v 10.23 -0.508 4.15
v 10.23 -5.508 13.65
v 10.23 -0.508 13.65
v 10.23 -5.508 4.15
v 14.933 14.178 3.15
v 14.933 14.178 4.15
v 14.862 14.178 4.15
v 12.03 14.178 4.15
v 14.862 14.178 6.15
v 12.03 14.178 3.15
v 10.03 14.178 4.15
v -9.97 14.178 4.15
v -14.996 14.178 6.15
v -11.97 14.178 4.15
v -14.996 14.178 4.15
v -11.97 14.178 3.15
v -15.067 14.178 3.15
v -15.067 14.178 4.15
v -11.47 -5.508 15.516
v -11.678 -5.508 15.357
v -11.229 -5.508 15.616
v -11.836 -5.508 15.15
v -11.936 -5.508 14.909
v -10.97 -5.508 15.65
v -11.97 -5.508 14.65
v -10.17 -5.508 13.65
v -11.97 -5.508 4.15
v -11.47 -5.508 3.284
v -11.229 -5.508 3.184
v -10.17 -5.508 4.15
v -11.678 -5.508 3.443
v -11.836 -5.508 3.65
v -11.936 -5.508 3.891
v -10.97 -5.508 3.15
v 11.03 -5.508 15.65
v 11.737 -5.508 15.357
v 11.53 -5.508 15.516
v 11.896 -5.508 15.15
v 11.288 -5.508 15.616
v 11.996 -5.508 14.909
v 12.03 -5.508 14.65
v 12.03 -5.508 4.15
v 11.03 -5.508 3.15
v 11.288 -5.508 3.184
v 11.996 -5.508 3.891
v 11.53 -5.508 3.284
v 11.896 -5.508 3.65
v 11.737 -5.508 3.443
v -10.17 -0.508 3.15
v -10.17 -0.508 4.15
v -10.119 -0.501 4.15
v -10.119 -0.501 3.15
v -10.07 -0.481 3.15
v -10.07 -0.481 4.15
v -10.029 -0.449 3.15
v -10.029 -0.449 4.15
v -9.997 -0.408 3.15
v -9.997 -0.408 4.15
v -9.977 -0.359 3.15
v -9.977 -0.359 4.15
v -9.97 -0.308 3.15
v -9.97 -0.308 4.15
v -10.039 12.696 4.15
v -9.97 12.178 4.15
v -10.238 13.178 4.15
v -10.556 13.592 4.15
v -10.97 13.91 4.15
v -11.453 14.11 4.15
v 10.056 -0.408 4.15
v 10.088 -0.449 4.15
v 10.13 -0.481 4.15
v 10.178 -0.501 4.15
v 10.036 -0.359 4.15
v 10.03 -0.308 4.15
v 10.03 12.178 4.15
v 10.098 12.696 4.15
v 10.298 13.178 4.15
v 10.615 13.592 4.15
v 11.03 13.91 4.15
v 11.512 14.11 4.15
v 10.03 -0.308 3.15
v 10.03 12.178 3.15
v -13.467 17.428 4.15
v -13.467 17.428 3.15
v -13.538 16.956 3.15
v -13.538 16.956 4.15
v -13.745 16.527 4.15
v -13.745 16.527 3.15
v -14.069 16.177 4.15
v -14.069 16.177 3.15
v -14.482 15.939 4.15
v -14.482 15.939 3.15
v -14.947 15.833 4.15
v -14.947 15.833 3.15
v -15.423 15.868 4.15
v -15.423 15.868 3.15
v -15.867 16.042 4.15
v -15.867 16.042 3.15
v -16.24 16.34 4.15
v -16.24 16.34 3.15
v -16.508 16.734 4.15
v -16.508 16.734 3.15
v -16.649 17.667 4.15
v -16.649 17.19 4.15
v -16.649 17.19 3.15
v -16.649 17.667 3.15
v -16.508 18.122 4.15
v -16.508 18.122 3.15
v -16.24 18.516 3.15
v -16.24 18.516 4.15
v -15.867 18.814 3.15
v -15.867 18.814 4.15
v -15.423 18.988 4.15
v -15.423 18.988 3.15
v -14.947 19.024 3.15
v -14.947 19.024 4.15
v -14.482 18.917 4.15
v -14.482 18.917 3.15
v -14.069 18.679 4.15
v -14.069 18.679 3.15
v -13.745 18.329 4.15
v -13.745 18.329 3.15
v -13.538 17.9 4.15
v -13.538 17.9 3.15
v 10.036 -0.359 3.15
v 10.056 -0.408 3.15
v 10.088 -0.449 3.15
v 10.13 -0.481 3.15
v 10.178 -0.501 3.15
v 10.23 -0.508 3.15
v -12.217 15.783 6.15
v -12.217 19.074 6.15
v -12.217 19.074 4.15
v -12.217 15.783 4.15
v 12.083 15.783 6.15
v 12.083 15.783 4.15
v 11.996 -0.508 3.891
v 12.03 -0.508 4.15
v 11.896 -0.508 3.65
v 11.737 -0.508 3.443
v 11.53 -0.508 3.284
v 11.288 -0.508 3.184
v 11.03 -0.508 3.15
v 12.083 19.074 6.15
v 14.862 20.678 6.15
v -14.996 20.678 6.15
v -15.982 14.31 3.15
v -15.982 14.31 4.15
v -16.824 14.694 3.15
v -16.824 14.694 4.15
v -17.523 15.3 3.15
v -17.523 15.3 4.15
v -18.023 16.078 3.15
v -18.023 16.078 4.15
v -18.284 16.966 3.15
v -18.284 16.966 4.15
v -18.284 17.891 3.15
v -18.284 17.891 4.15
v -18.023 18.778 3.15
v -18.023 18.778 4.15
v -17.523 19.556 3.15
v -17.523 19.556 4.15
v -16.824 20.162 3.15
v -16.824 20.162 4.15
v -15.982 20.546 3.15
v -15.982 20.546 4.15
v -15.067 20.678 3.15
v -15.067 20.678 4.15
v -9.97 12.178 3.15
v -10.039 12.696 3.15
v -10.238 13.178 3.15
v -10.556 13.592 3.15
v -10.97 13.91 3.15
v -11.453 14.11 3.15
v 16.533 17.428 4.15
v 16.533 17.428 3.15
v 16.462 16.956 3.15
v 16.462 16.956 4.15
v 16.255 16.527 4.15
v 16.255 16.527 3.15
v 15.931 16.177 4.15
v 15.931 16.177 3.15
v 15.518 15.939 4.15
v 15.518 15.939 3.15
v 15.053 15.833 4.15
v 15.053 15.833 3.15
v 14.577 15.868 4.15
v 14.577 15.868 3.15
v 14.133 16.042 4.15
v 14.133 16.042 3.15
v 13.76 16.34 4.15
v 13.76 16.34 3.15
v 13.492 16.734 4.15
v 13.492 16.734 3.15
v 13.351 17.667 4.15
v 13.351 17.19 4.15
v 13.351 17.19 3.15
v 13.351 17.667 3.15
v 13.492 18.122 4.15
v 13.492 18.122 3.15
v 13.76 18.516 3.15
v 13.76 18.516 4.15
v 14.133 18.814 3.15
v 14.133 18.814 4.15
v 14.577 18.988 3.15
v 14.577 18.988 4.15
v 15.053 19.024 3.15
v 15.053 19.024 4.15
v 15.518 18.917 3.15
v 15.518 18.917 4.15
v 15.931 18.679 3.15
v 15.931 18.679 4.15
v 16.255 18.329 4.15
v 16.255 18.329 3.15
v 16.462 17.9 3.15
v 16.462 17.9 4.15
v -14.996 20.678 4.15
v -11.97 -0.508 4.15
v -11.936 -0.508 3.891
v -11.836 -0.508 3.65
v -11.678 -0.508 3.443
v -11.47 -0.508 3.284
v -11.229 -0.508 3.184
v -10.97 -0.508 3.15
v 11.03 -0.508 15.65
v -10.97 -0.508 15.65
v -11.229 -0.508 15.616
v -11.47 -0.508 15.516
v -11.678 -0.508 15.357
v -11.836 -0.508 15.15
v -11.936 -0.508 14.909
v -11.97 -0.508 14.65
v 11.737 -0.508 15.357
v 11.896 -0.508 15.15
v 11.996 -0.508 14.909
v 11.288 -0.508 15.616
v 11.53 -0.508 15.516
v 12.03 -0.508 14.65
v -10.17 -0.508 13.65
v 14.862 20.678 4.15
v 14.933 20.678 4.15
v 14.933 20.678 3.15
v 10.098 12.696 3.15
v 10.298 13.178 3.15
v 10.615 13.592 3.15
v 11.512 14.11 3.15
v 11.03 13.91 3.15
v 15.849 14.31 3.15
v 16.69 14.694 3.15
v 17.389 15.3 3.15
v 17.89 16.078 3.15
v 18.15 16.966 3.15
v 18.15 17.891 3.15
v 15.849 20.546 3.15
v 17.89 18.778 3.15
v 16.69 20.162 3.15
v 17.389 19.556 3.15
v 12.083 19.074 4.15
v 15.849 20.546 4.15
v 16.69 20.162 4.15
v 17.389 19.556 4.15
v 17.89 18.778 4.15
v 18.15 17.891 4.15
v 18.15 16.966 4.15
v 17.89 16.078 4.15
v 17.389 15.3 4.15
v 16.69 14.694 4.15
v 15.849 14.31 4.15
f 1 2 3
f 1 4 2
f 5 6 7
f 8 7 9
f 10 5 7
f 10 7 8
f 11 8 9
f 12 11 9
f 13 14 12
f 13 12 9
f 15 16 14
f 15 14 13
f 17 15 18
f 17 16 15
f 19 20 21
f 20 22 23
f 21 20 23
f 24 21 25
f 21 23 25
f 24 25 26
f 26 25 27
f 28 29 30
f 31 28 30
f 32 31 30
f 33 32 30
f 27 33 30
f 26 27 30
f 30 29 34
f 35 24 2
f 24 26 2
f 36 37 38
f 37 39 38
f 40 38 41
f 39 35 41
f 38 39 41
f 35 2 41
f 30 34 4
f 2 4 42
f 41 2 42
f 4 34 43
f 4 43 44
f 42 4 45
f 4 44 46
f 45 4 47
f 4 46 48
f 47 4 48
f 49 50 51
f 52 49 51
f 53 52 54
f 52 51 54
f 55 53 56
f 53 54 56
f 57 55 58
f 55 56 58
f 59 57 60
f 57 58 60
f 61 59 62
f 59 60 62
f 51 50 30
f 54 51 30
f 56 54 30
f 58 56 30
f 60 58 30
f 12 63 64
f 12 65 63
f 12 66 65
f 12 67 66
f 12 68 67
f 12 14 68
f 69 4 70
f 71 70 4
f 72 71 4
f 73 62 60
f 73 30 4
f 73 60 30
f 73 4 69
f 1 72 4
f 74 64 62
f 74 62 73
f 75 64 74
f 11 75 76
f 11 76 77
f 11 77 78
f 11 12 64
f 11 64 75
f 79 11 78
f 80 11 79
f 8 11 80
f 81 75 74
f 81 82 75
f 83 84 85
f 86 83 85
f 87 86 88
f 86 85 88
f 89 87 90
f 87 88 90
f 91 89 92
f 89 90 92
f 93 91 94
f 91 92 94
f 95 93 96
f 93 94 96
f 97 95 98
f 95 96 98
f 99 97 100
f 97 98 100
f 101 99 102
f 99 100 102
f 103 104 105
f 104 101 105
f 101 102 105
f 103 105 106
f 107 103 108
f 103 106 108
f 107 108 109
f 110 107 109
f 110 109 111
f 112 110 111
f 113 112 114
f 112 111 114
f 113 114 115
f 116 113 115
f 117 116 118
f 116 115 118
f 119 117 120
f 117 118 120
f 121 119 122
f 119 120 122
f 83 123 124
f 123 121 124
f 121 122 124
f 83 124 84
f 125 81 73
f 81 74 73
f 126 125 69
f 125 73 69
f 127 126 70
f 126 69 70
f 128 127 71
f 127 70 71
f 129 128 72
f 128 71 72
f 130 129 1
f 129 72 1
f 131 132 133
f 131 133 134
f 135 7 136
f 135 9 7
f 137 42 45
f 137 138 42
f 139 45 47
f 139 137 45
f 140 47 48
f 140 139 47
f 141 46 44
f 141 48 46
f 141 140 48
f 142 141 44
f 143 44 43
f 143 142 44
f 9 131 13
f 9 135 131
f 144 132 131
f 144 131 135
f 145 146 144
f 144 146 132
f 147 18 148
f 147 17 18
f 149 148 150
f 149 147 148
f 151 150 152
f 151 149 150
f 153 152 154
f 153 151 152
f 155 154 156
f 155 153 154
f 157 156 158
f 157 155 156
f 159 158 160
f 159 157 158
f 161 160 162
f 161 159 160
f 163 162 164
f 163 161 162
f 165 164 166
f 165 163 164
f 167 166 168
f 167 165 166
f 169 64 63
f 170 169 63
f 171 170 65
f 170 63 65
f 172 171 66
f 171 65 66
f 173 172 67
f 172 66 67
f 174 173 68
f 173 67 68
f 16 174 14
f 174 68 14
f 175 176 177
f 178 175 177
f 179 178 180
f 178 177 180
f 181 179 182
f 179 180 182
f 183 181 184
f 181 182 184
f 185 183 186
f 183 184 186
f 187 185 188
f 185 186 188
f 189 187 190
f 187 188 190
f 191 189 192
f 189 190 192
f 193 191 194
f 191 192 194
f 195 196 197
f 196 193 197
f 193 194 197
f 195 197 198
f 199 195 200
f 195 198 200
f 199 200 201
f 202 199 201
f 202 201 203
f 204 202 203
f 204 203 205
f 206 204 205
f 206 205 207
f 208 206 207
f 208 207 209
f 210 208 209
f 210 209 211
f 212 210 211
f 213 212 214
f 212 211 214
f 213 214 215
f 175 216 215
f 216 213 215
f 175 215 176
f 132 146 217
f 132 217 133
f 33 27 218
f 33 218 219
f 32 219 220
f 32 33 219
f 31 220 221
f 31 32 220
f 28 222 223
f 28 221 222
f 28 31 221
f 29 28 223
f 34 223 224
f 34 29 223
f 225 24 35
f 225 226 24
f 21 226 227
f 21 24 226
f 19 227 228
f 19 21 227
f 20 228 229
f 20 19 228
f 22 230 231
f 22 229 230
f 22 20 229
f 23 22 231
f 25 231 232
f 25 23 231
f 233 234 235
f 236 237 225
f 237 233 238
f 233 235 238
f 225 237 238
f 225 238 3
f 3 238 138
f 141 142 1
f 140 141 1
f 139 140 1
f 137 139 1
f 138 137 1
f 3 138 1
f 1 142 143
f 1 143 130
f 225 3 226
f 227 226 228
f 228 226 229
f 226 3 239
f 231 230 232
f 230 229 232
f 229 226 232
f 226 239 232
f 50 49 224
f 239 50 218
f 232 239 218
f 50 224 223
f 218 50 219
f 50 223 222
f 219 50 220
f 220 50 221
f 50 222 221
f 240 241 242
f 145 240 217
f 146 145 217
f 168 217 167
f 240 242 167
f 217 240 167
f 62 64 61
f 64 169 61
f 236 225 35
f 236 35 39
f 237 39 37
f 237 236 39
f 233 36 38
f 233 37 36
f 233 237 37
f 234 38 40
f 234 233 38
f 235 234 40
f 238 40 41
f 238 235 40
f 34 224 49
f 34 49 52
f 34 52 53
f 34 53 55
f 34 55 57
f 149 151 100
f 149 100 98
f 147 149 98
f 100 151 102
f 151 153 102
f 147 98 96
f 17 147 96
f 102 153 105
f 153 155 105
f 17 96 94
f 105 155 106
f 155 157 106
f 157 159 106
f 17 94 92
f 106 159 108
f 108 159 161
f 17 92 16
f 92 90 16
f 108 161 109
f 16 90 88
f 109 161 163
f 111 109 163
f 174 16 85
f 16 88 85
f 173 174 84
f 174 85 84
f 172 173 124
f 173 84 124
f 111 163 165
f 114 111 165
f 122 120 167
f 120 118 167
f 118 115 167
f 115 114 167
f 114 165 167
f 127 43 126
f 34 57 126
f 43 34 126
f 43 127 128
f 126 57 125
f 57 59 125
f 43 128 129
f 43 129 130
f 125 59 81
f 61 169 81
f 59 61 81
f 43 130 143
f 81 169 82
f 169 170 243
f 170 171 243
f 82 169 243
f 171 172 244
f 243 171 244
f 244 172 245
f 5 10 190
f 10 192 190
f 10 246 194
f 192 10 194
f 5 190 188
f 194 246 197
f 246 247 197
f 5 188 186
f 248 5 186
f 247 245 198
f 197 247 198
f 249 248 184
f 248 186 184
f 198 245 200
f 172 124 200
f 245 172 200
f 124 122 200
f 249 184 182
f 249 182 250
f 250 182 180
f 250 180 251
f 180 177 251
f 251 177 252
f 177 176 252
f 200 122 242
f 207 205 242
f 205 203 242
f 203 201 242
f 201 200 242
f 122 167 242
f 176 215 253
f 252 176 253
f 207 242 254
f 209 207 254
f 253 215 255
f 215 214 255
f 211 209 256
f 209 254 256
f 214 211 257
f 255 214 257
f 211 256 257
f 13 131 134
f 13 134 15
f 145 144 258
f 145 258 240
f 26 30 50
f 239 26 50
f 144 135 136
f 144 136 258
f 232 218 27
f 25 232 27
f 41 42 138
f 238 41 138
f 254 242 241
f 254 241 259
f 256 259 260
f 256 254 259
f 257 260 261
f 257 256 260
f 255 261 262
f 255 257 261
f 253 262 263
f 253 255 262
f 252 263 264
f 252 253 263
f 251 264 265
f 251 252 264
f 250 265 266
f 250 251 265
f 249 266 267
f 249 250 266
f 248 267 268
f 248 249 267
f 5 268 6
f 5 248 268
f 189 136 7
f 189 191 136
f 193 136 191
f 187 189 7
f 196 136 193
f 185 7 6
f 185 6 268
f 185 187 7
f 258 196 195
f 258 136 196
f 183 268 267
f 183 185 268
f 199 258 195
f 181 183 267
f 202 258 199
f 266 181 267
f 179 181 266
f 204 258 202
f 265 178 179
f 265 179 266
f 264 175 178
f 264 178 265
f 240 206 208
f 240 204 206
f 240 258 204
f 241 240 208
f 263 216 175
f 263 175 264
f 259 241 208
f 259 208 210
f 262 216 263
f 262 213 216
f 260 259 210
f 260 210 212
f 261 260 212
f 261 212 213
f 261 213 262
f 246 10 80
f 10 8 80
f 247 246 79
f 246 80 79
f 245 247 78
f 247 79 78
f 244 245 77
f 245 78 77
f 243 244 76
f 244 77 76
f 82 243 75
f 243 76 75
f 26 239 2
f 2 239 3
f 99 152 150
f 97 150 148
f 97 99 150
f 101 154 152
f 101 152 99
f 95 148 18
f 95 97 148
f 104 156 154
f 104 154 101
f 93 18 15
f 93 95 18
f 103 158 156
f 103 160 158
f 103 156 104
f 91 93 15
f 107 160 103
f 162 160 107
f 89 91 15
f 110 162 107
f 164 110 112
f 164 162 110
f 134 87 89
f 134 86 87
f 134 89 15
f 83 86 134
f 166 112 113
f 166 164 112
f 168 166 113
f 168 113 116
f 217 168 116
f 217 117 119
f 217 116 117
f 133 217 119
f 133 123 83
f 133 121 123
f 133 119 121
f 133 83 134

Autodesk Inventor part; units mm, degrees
ref_plane "YZ Plane" through (0, 0, 0) normal (1, 0, 0) x (0, 1, 0)
sketch "Szkic1" plane through (0, 0, 0) normal (0, 0, 1) x (1, 0, 0)
  circle A0 centre (-15.0668, 17.4281) radius 1.6 projected
  circle A1 centre (14.9332, 17.4281) radius 1.6 projected
  circle A2 centre (14.9332, 17.4281) radius 3.25
  circle A3 centre (-15.0668, 17.4281) radius 3.25
  line L0 (14.9332, 14.1781) -> (9.4332, 14.1781)
  line L1 (9.4332, 14.1781) -> (9.4332, 20.6781)
  line L2 (9.4332, 20.6781) -> (14.9332, 20.6781)
  line L3 (14.9332, 20.6781) -> (14.9332, 14.1781)
  line L4 (-15.0668, 14.1781) -> (-9.5668, 14.1781)
  line L5 (-9.5668, 14.1781) -> (-9.5668, 20.6781)
  line L6 (-9.5668, 20.6781) -> (-15.0668, 20.6781)
  line L7 (-15.0668, 20.6781) -> (-15.0668, 14.1781)
  point P0 (0, 0)
  dimension "d0" = 6.5
  dimension "d1" = 6.5
  dimension "d2" = 5.5
  dimension "d3" = 5.5
ref_plane "Płaszczyzna konstrukcyjna1" through (-7.6204, -2.8576, 3.15) normal (0, 0, 1) x (1, 0, 0)
extrude "Wyciągnięcie proste1" add sketch "Szkic1" along normal up to surface (3.15 mm away) contours A0 L7 A3 | A0 L7 A3 | L6 L5 L4 A3 | A1 L3 A2 | A1 L3 A2 | A2 L0 L1 L2
ref_plane "Płaszczyzna konstrukcyjna2" through (-10.5274, -25.5076, 4.15) normal (0, 0, -1) x (0, 1, 0)
sketch "Szkic4" plane through (9.4332, 20.6781, 3.15) normal (0, 0, 1) x (1, 0, 0)
  line L0 (0.5964, -6.1857) -> (-19.4036, -6.1857) projected
  line L1 (-19.4036, -6.1857) -> (-19.4036, -46.1857) projected
  line L2 (0.5964, -46.1857) -> (-19.4036, -46.1857) projected
  line L3 (0.5964, -6.1857) -> (0.5964, -46.1857) projected
  line L4 (-21.4036, -26.1857) -> (2.5964, -26.1857)
  line L5 (2.5964, -26.1857) -> (2.5964, -21.1857)
  line L6 (2.5964, -21.1857) -> (-21.4036, -21.1857)
  line L7 (-21.4036, -21.1857) -> (-21.4036, -26.1857)
  circle A0 centre (-24.5, -3.25) radius 1.6 projected
  line L8 (-19, -6.5) -> (-24.5, -6.5) projected
  line L9 (-19, 0) -> (-19, -6.5) projected
  line L10 (-24.5, 0) -> (-19, 0) projected
  arc A1 (-24.5, 0) -> (-24.5, -6.5) centre (-24.5, -3.25) ccw projected
  arc A2 (5.5, -6.5) -> (5.5, 0) centre (5.5, -3.25) ccw projected
  line L11 (0, 0) -> (5.5, 0) projected
  line L12 (0, -6.5) -> (0, 0) projected
  line L13 (5.5, -6.5) -> (0, -6.5) projected
  circle A3 centre (5.5, -3.25) radius 1.6 projected
  line L14 (-19, 0) -> (0, 0)
  point P0 (-9.4332, -20.6781)
  point P1 (-9.4036, -26.1857)
  point P2 (-9.4036, -46.1857)
  point P3 (0.5964, -21.1857)
  point P4 (0.5964, -6.5)
  point P5 (-19.4036, -6.5)
  point P6 (-19.4036, -21.1857)
  dimension "d15" = 5
  dimension "d16" = 15
  dimension "d17" = 2
extrude "Wyciągnięcie proste4" add sketch "Szkic4" along normal blind 1 contours L3 L13 L12 L0 | L0 L12 L11 A2 L13 L3 | L12 L13 L3 L6 L1 L8 L9 L0 | L0 L9 L14 L12 | L9 L8 L1 L0 | L0 L1 L8 A1 L10 L9 | L6 L5 L4 L3 | L3 L4 L1 L6 | L1 L4 L7 L6
sketch "Szkic5" plane through (9.4332, 20.6781, 4.15) normal (0, 0, 1) x (1, 0, 0)
  line L0 (-21.4036, -21.1857) -> (-21.4036, -26.1857) projected
  line L1 (2.5964, -21.1857) -> (0.5964, -21.1857) projected
  line L2 (0.5964, -21.1857) -> (0.5964, -6.5) projected
  line L3 (0.5964, -6.5) -> (5.5, -6.5) projected
  arc A0 (5.5, -6.5) -> (5.5, 0) centre (5.5, -3.25) ccw projected
  line L4 (5.5, 0) -> (-24.5, 0) projected
  arc A1 (-24.5, 0) -> (-24.5, -6.5) centre (-24.5, -3.25) ccw projected
  line L5 (-24.5, -6.5) -> (-19.4036, -6.5) projected
  line L6 (-19.4036, -6.5) -> (-19.4036, -21.1857) projected
  line L7 (-19.4036, -21.1857) -> (-21.4036, -21.1857) projected
  line L8 (-21.4036, -21.1857) -> (-21.4036, -26.1857) projected
  line L9 (-21.4036, -26.1857) -> (2.5964, -26.1857) projected
  line L10 (2.5964, -26.1857) -> (2.5964, -21.1857) projected
  circle A2 centre (5.5, -3.25) radius 1.6 projected
  circle A3 centre (-24.5, -3.25) radius 1.6 projected
  line L11 (-21.4036, -26.1857) -> (-19.6036, -26.1857)
  line L12 (-19.6036, -26.1857) -> (-19.6036, -21.1857)
  line L13 (-19.6036, -21.1857) -> (-21.4036, -21.1857)
  line L14 (-21.4036, -21.1857) -> (-21.4036, -26.1857)
  line L15 (2.5964, -26.1857) -> (2.5964, -21.1857) projected
  line L16 (2.5964, -26.1857) -> (0.7964, -26.1857)
  line L17 (0.7964, -26.1857) -> (0.7964, -21.1857)
  line L18 (0.7964, -21.1857) -> (2.5964, -21.1857)
  line L19 (2.5964, -21.1857) -> (2.5964, -26.1857)
  point P0 (-9.4332, -20.6781)
  point P1 (0.7964, -26.1857)
  dimension "d20" = 1.8
  dimension "d21" = 1.8
extrude "Wyciągnięcie proste5" add sketch "Szkic5" along normal blind 9.5 contours L7 L12 L9 L0 | L17 L1 L10 L9
sketch "Szkic6" plane through (9.4332, 20.6781, 13.65) normal (0, 0, 1) x (1, 0, 0)
  line L0 (-19.6036, -21.1857) -> (-21.4036, -21.1857) projected
  line L1 (-21.4036, -21.1857) -> (-21.4036, -26.1857) projected
  line L2 (-21.4036, -26.1857) -> (-19.6036, -26.1857) projected
  line L3 (-19.6036, -26.1857) -> (-19.6036, -21.1857) projected
  line L4 (0.7964, -26.1857) -> (2.5964, -26.1857) projected
  line L5 (2.5964, -26.1857) -> (2.5964, -21.1857) projected
  line L6 (2.5964, -21.1857) -> (0.7964, -21.1857) projected
  line L7 (0.7964, -21.1857) -> (0.7964, -26.1857) projected
  line L8 (-21.4036, -21.1857) -> (-21.4036, -26.1857) projected
  line L9 (-21.4036, -26.1857) -> (2.5964, -26.1857)
  line L10 (2.5964, -26.1857) -> (2.5964, -21.1857)
  line L11 (2.5964, -21.1857) -> (-21.4036, -21.1857)
  line L12 (-21.4036, -21.1857) -> (-21.4036, -26.1857)
  point P0 (-9.4332, -20.6781)
extrude "Wyciągnięcie proste6" add sketch "Szkic6" along normal blind 2
fillet "Zaokrąglenie3" radius 1 4 edges at (12.0296, -3.0076, 15.65) (-11.9704, -3.0076, 15.65) (12.0296, -3.0076, 3.15) (-11.9704, -3.0076, 3.15)
sketch "Szkic7" plane through (9.4332, 20.6781, 4.15) normal (0, 0, 1) x (1, 0, 0)
  line L0 (0.7964, -26.1857) -> (0.7964, -21.1857) projected
  line L1 (0.7964, -21.1857) -> (0.5964, -21.1857) projected
  line L2 (0.5964, -21.1857) -> (0.5964, -6.5) projected
  line L3 (0.5964, -6.5) -> (5.5, -6.5) projected
  arc A0 (5.5, -6.5) -> (5.5, 0) centre (5.5, -3.25) ccw projected
  line L4 (5.5, 0) -> (-24.5, 0) projected
  arc A1 (-24.5, 0) -> (-24.5, -6.5) centre (-24.5, -3.25) ccw projected
  line L5 (-24.5, -6.5) -> (-19.4036, -6.5) projected
  line L6 (-19.4036, -6.5) -> (-19.4036, -21.1857) projected
  line L7 (-19.4036, -21.1857) -> (-19.6036, -21.1857) projected
  line L8 (-19.6036, -21.1857) -> (-19.6036, -26.1857) projected
  line L9 (-19.6036, -26.1857) -> (0.7964, -26.1857) projected
  circle A2 centre (5.5, -3.25) radius 1.6 projected
  circle A3 centre (-24.5, -3.25) radius 1.6 projected
  line L10 (-19.4036, -6.5) -> (0.5964, -6.5)
  line L11 (-19, -6.5) -> (-19, 0) projected
  point P0 (-9.4332, -20.6781)
extrude "Wyciągnięcie proste7" add sketch "Szkic7" along normal blind 2 contours L10 L11 L4 A0 L3 | L10 L5 A1 L4 L11
sketch "Szkic8" plane through (9.4332, 20.6781, 6.15) normal (0, 0, 1) x (1, 0, 0)
  circle A0 centre (5.5, -3.25) radius 1.6 projected
  circle A1 centre (-24.5, -3.25) radius 1.6 projected
  circle A2 centre (5.5, -3.25) radius 2.85
  circle A3 centre (-24.5, -3.25) radius 2.85
  line L0 (8.35, -4.8954) -> (5.5, -6.5409)
  line L1 (5.5, -6.5409) -> (2.65, -4.8954)
  line L2 (2.65, -4.8954) -> (2.65, -1.6046)
  line L3 (2.65, -1.6046) -> (5.5, 0.0409)
  line L4 (5.5, 0.0409) -> (8.35, -1.6046)
  line L5 (8.35, -1.6046) -> (8.35, -4.8954)
  line L6 (5.5, 0) -> (-24.5, 0) projected
  arc A4 (-24.5, 0) -> (-24.5, -6.5) centre (-24.5, -3.25) ccw projected
  line L7 (-24.5, -6.5) -> (5.5, -6.5) projected
  arc A5 (5.5, -6.5) -> (5.5, 0) centre (5.5, -3.25) ccw projected
  circle A6 centre (-24.5, -3.25) radius 1.6 projected
  circle A7 centre (5.5, -3.25) radius 1.6 projected
  line L8 (-27.35, -1.6046) -> (-24.5, 0.0409)
  line L9 (-24.5, 0.0409) -> (-21.65, -1.6046)
  line L10 (-21.65, -1.6046) -> (-21.65, -4.8954)
  line L11 (-21.65, -4.8954) -> (-24.5, -6.5409)
  line L12 (-24.5, -6.5409) -> (-27.35, -4.8954)
  line L13 (-27.35, -4.8954) -> (-27.35, -1.6046)
  point P0 (-9.4332, -20.6781)
  point P1 (8.35, -3.25)
  point P2 (-27.35, -3.25)
  point P3 (-24.5722, -0.0008)
  point P4 (-27.2778, -1.5629)
  point P5 (-27.35, -1.688)
  point P6 (-27.35, -4.812)
  point P7 (-27.2778, -4.9371)
  point P8 (-24.5722, -6.4992)
  point P9 (5.5722, -6.4992)
  point P10 (8.2778, -4.9371)
  point P11 (8.35, -4.812)
  point P12 (8.35, -1.688)
  point P13 (8.2778, -1.5629)
  point P14 (5.5722, -0.0008)
  dimension "d29" = 5.7
  dimension "d30" = 5.7
extrude "Wyciągnięcie proste8" cut sketch "Szkic8" against normal blind 2 contours A0 | A1 | A2 | L5 A5 L0 A2 | A2 L4 A5 L5 | L5 A5 | A2 L3 L6 A5 L4 | L4 A5 | L0 A5 L7 L1 A2 | L0 A5 | A5 L4 L5 | L5 L0 A5 | A2 L2 L3 | A5 L6 L3 L4 | L1 L2 A2 | L0 L1 L7 A5 | L9 A3 L8 A4 L6 | L6 A4 L8 L9 | L11 L12 A4 L7 | L7 A4 L12 A3 L11 | L9 L10 A3 | A3 | A3 L10 L11 | L8 A4 | A3 L13 A4 L8 | A4 L12 | L12 A4 L13 A3 | A4 L13 L8 | L13 A4 | L12 L13 A4
sketch "Szkic10" plane through (0, 0, 0) normal (0, 0, -1) x (-1, 0, 0)
  line L0 (9.5668, 14.1781) -> (9.5668, 20.6781) projected
  line L1 (15.0668, 14.1781) -> (9.5668, 14.1781) projected
  arc A0 (15.0668, 14.1781) -> (15.0668, 20.6781) centre (15.0668, 17.4281) ccw projected
  line L2 (9.5668, 20.6781) -> (15.0668, 20.6781) projected
  circle A1 centre (15.0668, 17.4281) radius 1.6 projected
  line L3 (-14.9332, 20.6781) -> (-9.4332, 20.6781) projected
  arc A2 (-14.9332, 20.6781) -> (-14.9332, 14.1781) centre (-14.9332, 17.4281) ccw projected
  line L4 (-9.4332, 14.1781) -> (-14.9332, 14.1781) projected
  line L5 (-9.4332, 20.6781) -> (-9.4332, 14.1781) projected
  circle A3 centre (-14.9332, 17.4281) radius 1.6 projected
  point P0 (0, 0)
extrude "Wyciągnięcie proste9" cut sketch "Szkic10" against normal up to surface (3.15 mm away)
fillet "Zaokrąglenie4" radius 2 2 edges at (-9.9704, 14.1781, 3.65) (10.0296, 14.1781, 3.65)
fillet "Zaokrąglenie5" radius 0.2 2 edges at (-9.9704, -0.5076, 3.65) (10.0296, -0.5076, 3.65)
properties part number "trzymacz"
